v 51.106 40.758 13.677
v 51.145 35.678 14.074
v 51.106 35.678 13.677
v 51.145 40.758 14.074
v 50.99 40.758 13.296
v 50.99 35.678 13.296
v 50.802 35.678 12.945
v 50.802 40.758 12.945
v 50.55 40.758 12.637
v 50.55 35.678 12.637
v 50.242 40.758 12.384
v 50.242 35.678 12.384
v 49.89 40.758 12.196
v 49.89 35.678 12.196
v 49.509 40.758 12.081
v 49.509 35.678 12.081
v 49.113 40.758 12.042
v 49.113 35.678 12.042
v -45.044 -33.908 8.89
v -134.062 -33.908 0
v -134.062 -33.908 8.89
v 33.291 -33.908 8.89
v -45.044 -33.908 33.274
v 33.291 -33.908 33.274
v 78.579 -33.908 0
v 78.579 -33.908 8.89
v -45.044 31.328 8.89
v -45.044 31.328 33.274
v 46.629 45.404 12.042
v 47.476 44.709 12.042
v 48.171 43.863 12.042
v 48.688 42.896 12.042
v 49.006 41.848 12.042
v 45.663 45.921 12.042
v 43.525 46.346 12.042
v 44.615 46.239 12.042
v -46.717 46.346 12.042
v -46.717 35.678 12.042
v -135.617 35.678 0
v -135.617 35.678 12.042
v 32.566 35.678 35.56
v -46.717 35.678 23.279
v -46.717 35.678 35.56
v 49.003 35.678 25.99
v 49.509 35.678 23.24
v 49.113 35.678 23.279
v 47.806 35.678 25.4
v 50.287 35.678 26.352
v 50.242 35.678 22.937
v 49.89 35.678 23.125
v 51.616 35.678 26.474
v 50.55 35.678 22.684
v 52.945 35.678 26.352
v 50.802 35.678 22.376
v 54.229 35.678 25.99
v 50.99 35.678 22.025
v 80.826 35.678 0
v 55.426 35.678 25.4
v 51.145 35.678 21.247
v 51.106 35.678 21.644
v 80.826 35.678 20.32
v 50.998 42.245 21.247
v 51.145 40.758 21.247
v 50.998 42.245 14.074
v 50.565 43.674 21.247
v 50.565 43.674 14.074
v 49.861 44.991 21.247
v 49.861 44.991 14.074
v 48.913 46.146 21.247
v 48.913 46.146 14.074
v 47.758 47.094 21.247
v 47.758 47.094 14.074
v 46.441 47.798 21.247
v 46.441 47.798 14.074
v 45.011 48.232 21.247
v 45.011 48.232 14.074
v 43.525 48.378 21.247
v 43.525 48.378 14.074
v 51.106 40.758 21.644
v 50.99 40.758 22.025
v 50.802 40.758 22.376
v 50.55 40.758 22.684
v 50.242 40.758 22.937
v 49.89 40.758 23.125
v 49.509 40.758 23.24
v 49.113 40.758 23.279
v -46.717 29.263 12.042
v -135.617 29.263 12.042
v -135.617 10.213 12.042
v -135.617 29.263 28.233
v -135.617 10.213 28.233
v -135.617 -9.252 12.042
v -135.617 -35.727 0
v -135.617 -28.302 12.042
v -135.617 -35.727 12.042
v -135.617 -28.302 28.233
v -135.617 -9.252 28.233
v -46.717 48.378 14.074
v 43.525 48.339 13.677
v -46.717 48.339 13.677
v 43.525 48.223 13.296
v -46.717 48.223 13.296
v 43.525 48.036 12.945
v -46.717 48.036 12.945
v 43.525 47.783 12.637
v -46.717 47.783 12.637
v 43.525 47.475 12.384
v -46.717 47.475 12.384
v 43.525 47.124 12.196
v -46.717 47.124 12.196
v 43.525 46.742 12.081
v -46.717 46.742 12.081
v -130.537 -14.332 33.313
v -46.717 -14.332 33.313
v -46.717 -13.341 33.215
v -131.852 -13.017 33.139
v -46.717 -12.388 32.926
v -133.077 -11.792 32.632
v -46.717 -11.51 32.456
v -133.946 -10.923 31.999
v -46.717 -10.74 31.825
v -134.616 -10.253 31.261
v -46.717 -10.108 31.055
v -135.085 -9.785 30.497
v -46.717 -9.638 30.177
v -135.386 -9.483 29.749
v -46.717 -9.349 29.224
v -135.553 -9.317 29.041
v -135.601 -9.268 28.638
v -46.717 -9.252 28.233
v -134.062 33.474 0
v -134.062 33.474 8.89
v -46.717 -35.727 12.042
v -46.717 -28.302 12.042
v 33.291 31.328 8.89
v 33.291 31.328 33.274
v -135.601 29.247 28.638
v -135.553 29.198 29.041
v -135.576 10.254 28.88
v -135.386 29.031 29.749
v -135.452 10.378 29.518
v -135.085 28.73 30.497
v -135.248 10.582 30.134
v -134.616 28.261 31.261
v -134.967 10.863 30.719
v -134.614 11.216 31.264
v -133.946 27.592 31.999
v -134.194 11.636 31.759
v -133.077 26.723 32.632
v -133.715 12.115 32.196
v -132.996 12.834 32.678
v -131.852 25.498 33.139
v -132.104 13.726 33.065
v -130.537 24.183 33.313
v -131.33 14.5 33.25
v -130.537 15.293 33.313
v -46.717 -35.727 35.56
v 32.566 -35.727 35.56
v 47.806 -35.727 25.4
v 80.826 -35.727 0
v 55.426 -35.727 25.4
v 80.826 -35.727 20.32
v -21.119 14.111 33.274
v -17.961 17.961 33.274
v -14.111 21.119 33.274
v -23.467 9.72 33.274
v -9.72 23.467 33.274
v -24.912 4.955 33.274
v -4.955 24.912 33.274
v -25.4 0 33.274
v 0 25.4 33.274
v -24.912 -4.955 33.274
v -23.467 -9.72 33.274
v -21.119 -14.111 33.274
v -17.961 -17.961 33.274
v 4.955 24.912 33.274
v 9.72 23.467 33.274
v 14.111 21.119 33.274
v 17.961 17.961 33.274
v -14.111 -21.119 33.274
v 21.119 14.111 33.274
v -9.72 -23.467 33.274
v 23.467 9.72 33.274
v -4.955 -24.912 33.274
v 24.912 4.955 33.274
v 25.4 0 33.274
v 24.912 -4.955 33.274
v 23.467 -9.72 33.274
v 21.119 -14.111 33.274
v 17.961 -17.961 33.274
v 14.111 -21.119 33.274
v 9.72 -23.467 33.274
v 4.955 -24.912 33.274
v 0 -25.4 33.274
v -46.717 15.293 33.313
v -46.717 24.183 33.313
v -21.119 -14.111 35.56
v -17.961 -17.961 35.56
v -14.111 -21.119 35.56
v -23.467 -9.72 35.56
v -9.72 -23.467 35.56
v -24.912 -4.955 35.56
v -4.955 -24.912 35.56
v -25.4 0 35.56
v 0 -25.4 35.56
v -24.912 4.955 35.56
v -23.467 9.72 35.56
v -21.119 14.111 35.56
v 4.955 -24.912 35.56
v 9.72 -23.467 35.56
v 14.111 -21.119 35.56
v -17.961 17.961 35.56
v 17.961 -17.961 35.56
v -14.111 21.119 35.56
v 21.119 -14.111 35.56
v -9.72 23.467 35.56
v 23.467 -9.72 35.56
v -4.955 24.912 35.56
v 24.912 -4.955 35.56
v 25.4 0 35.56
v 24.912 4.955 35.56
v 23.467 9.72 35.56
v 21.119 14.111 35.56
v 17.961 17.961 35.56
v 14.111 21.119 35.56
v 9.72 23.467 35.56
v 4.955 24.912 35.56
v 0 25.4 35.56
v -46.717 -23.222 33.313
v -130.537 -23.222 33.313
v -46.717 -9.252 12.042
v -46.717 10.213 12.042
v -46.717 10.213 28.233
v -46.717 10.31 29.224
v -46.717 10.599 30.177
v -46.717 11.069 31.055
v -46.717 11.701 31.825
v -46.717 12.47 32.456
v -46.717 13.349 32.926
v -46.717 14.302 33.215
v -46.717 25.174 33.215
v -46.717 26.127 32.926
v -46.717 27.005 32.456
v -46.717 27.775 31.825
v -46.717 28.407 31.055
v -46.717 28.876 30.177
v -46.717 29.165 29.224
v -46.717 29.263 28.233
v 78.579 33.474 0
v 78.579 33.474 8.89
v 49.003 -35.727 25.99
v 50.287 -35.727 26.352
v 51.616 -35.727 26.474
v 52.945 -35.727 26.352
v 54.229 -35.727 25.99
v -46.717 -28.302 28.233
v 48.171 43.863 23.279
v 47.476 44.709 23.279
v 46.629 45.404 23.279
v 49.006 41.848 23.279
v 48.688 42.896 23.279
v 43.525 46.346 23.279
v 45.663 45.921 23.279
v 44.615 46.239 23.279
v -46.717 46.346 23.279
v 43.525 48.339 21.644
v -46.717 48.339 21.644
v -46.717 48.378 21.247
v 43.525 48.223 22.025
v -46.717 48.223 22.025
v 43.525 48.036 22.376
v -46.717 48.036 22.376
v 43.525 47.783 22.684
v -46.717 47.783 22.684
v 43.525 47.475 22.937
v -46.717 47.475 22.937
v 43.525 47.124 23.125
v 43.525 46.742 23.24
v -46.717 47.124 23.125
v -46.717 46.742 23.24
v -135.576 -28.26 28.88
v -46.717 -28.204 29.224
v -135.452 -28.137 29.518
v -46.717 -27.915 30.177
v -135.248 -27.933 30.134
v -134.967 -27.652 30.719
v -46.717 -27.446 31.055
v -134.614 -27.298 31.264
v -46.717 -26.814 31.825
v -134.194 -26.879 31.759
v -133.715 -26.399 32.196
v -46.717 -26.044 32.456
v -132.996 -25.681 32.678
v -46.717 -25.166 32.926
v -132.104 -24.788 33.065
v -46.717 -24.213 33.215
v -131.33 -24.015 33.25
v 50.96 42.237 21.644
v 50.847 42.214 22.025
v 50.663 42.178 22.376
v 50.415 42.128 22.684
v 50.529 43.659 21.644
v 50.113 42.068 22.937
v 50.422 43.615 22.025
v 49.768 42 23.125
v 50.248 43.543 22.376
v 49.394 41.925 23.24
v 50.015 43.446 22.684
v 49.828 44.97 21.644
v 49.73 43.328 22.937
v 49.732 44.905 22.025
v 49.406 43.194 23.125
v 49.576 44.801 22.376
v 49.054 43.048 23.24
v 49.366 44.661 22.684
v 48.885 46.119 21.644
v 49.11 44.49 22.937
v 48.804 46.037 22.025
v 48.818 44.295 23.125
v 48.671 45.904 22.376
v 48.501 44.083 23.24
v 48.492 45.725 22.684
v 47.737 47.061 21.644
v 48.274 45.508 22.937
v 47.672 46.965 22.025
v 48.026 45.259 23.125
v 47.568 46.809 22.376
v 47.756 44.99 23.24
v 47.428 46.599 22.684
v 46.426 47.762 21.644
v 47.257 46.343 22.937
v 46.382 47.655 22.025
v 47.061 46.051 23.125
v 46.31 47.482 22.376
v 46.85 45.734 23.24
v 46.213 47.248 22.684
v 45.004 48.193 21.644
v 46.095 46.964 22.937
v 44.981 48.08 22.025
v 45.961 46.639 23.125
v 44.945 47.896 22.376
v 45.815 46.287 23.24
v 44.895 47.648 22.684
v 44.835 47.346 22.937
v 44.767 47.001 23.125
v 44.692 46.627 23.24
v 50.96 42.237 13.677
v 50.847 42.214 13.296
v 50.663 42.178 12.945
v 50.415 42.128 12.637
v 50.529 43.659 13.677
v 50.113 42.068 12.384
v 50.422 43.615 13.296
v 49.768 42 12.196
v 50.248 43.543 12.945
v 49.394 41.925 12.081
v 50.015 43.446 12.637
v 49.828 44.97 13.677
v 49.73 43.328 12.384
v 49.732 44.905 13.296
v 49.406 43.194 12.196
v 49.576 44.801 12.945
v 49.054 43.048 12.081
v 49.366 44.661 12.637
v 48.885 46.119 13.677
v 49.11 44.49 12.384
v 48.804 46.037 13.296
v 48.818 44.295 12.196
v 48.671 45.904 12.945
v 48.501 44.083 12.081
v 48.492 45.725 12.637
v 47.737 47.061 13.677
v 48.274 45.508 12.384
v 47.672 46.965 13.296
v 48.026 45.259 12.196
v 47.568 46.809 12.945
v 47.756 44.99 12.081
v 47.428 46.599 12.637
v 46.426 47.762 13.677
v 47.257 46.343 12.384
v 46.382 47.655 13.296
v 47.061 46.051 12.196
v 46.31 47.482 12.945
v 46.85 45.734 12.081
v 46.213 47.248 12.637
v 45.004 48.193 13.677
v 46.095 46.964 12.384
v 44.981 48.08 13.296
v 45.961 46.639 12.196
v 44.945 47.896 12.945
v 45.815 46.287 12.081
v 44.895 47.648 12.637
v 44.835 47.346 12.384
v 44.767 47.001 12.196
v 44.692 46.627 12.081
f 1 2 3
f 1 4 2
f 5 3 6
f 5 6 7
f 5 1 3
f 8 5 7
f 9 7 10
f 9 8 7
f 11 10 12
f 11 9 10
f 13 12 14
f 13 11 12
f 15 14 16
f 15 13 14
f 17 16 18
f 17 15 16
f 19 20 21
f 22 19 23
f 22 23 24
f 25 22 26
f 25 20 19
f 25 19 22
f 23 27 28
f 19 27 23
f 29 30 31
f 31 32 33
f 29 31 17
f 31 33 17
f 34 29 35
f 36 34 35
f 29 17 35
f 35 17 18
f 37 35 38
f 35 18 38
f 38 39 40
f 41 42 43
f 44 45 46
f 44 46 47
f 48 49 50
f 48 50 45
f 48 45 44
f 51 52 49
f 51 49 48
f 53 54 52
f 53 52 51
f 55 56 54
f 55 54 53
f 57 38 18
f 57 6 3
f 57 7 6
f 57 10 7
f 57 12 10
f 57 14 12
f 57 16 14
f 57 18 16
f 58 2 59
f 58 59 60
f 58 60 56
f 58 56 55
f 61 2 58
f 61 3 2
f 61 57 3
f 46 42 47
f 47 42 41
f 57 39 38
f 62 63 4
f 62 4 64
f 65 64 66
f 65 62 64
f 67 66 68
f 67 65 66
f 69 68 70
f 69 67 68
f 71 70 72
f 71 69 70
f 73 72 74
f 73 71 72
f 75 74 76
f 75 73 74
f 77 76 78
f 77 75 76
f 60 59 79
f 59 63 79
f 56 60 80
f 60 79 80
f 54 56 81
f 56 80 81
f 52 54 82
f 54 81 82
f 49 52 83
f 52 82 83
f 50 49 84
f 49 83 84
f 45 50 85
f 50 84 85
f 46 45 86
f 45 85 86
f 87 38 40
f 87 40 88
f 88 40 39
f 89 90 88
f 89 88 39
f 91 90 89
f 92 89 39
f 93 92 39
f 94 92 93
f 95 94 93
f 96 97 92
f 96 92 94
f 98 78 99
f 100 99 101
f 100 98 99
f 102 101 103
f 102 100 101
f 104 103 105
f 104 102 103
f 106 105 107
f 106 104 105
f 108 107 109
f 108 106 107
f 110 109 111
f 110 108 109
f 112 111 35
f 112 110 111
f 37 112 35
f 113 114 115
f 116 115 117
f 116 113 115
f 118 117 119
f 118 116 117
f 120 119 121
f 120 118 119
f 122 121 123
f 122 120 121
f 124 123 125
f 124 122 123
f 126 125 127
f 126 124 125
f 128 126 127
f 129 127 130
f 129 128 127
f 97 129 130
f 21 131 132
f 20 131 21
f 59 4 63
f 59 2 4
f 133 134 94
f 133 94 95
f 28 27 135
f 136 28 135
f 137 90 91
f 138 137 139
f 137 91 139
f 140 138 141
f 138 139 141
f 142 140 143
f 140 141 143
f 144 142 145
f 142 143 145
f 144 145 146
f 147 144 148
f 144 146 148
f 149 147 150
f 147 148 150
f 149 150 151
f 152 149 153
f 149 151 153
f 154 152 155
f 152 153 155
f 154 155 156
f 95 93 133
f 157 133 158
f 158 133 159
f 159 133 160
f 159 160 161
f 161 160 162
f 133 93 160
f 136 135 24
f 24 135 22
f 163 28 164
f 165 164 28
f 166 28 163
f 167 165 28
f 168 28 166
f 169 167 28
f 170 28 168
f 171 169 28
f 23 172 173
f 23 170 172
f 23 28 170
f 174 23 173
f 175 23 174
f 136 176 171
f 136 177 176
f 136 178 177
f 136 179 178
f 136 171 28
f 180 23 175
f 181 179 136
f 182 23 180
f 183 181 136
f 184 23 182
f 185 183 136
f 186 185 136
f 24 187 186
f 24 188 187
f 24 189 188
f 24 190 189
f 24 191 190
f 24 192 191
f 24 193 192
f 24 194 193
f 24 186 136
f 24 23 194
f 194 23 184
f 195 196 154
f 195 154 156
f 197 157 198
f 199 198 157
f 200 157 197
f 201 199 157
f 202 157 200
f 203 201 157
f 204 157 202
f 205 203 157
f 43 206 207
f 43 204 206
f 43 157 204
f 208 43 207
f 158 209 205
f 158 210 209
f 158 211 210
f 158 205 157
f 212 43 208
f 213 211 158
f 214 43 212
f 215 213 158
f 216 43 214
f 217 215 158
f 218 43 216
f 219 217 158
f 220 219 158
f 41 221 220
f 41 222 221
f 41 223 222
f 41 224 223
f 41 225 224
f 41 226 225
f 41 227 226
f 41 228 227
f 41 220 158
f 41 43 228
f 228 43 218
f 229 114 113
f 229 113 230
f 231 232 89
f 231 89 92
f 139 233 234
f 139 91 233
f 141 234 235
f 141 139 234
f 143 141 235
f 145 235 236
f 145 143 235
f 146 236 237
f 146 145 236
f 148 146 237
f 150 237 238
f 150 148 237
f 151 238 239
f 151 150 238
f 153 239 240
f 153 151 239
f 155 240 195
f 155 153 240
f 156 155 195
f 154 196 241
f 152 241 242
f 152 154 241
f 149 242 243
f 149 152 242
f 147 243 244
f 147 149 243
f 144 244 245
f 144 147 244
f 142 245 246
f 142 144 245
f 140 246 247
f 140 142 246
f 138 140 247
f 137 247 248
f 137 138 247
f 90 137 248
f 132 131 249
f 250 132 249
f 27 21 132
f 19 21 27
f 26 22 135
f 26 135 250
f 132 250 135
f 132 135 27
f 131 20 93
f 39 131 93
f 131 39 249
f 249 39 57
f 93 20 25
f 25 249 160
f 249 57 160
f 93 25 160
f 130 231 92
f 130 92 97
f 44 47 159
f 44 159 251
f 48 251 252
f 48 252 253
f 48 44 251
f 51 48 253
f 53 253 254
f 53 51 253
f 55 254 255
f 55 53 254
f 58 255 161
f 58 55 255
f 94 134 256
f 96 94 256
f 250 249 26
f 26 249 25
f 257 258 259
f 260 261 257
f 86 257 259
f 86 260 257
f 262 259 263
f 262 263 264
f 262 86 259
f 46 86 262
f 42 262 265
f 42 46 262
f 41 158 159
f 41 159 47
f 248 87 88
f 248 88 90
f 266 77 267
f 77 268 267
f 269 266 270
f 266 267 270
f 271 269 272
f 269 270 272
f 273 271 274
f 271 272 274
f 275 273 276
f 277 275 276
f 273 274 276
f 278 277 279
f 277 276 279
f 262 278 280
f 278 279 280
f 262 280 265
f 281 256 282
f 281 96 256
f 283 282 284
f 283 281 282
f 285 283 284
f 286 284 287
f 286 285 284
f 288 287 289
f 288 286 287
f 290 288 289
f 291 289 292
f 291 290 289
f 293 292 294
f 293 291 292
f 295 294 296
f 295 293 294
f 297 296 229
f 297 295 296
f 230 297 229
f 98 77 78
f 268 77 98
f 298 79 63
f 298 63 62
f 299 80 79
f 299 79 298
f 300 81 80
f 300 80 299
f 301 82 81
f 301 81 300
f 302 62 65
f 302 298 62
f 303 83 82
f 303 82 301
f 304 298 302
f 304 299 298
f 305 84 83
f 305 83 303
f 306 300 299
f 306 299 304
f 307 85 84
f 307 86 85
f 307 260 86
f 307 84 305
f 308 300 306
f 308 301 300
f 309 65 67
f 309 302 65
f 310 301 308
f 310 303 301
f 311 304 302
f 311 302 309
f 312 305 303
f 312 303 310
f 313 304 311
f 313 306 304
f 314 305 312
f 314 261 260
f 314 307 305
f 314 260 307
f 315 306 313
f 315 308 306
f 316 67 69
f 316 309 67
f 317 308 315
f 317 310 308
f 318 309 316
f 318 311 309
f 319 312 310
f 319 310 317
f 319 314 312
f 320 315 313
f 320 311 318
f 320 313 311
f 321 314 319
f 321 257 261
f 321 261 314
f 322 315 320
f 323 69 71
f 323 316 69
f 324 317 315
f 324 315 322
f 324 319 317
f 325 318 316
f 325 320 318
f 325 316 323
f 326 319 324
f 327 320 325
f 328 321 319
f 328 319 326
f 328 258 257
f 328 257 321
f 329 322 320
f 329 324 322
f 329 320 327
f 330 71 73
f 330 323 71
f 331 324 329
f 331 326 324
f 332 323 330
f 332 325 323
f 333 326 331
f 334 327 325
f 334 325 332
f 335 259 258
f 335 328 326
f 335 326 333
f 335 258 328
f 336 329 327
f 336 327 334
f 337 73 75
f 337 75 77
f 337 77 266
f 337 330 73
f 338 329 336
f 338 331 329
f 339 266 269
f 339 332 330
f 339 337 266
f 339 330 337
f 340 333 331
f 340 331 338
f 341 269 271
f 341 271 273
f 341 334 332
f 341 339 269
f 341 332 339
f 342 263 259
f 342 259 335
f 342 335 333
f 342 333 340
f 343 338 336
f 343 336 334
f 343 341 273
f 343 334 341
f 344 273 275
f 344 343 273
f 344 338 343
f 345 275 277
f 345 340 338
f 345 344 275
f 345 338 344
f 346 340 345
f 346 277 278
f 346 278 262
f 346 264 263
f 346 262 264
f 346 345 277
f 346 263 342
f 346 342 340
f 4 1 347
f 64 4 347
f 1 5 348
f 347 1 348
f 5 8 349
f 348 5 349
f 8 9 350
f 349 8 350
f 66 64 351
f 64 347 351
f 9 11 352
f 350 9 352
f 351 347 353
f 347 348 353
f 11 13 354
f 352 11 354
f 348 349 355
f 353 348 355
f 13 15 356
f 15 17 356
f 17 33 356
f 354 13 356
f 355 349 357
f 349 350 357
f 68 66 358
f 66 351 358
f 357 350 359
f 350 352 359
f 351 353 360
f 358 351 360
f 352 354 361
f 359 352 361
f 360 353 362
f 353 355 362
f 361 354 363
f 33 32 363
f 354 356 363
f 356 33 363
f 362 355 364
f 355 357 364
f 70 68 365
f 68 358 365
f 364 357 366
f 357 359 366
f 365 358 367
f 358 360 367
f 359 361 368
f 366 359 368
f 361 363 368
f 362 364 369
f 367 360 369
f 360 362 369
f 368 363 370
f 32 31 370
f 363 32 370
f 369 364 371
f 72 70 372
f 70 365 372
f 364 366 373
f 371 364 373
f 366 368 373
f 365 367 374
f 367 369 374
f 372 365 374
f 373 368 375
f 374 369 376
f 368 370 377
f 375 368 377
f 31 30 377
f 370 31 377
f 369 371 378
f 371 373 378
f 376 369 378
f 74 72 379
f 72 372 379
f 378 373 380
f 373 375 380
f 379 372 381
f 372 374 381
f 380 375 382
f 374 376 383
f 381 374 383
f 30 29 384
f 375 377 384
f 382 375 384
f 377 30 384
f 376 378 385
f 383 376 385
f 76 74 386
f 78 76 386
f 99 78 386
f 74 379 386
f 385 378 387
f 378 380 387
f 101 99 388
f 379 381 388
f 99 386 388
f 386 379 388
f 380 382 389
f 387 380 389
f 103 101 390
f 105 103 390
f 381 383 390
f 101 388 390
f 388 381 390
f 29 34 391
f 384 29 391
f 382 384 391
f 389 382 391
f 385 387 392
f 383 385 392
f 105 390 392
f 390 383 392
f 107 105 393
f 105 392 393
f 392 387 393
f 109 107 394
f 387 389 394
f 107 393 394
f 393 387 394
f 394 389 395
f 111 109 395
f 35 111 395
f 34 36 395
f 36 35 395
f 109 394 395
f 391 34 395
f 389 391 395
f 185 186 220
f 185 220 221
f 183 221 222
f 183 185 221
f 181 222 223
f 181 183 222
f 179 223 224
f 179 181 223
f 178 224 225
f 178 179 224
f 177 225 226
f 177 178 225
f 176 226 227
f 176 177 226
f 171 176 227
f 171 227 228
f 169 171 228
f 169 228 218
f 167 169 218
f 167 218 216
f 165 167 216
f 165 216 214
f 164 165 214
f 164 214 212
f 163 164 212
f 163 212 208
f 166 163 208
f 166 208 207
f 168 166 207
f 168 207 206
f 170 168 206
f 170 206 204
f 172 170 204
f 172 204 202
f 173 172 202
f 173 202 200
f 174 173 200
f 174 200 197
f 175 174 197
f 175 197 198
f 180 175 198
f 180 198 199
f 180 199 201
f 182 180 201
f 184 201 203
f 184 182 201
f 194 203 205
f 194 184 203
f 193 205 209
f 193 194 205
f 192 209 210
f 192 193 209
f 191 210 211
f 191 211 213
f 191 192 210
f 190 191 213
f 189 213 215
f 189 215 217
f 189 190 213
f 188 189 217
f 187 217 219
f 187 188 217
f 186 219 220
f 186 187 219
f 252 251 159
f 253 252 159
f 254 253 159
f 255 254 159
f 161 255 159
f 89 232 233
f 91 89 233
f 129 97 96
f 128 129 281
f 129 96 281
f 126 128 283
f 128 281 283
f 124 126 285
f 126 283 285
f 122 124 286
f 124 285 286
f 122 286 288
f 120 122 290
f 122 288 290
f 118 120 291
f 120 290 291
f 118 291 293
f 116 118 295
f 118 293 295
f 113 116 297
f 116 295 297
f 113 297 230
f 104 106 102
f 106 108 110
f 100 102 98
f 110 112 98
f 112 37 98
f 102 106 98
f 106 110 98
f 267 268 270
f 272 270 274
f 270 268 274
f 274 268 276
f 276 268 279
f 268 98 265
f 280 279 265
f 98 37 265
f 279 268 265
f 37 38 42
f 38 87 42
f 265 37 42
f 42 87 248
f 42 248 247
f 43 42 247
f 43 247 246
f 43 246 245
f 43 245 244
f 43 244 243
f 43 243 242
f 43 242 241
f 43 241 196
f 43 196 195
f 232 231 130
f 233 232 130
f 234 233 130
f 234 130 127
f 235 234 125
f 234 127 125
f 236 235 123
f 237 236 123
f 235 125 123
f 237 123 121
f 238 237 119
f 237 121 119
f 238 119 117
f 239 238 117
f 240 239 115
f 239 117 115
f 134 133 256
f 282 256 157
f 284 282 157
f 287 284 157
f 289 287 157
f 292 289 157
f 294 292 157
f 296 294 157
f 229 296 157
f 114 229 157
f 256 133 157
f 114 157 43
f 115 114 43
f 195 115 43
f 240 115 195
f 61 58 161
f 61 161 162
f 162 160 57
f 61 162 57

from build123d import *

# Parameters (mm, degrees)
F0_W        = 94.5233479142
F0_H        = 71.4051574469
F1_DEPTH    = 35.56
F2_R        = 25.4
F3_DEPTH    = 35.56
F4_SIZE2    = 15.24
F4_SIZE     = 10.16
F5_DEPTH    = 7.62
F7_DEPTH    = 71.4051658
F8_DEPTH    = 25.4
F9_T4_DEPTH = 203.3902674307
F9_S5_R     = 7.295449901
F9_T6_DEPTH = 104
F10_W       = 71.4051574469
F10_H       = 12.0417065918
F11_DEPTH   = 88.9
F12_W       = 19.05
F12_H       = 21.2708730352
F13_DEPTH   = 88.9
F14_W       = 19.05
F14_H       = 21.2708730352
F15_DEPTH   = 88.9
F16_R       = 5.08
F17_W       = 97.8622660041
F17_H       = 11.2377274781
F18_DEPTH   = 12.7
F19_R       = 7.62
F20_R       = 2.032
F21_W       = 212.6409783959
F21_H       = 67.3823393881
F22_DEPTH   = 8.89
F23_W       = 78.3353857696
F23_H       = 65.2360282838
F24_DEPTH   = 24.384


# Not quite as in the source:
# - a fillet or chamfer that OpenCascade refuses, or shapes differently, is made with other operations: its cross-section is extruded or revolved along the edge and cut away or added


with BuildPart() as f1:
    # F0 (on Top) → F1 (new body)
    with BuildSketch(Plane.XY):
        with Locations((0.5442798138, -0.0245943666)):
            Rectangle(F0_W, F0_H)
    extrude(amount=F1_DEPTH)

    # F2 (on Top) → F3 (cut)
    with BuildSketch(Plane.XY):
        Circle(F2_R)
    extrude(amount=F3_DEPTH, mode=Mode.SUBTRACT)

    # F4
    f4_edges = [f1.edges().sort_by_distance(p)[0] for p in [
        (47.805954, -0.024594, 35.56),
    ]]
    f4_side = f1.faces().sort_by_distance((47.805954, -0.024594, 17.78))[0]
    chamfer(f4_edges, length=F4_SIZE, length2=F4_SIZE2, reference=f4_side)

    # F5 (add): a face of the model
    f5_faces = [f1.faces().sort_by_distance(p)[0] for p in [
        (47.8059537709, -0.0245943666, 12.7),
    ]]
    extrude(f5_faces, amount=F5_DEPTH)

    # F6 (on face) → F7 (join)
    with BuildSketch(Plane(origin=(0, 35.6779843569, 0), x_dir=(-1, 0, 0), z_dir=(0, 1, 0))):
        with BuildLine():
            Line((-55.4259537709, 25.4), (-47.8059537709, 25.4))
            ThreePointArc((-47.8059537709, 25.4), (-51.6159537709, 26.473915584), (-55.4259537709, 25.4))
        make_face()
    extrude(amount=-F7_DEPTH)

    # F8 (add): a face of the model
    f8_faces = [f1.faces().sort_by_distance(p)[0] for p in [
        (55.4259537709, -0.0245943666, 12.7),
    ]]
    extrude(f8_faces, amount=F8_DEPTH)

    # F9: chamfer of 5.08 x 25.4 on 1 edges, made by hand


with BuildPart() as f9_tool2:
    # F9_s3 → F9_t4 (new body)
    with BuildSketch(Plane.XZ.offset(101.7197280819)):
        Polygon((55.4259537709, 25.4), (80.8259537709, 20.32), (80.8259537709, 25.4), align=None)
    extrude(amount=-F9_T4_DEPTH)

    # F9_s5 → F9_t6 (cut, symmetric)
    with BuildSketch(Plane.XZ):
        with Locations((51.6159537709, 19.178465683)):
            Circle(F9_S5_R)
    extrude(amount=F9_T6_DEPTH, both=True, mode=Mode.SUBTRACT)


with BuildPart() as f1_1:
    add(f1.part)

    # F9_t1: cut F9_tool2
    add(f9_tool2.part, mode=Mode.SUBTRACT)

    # F10 (on face) → F11 (join)
    with BuildSketch(Plane(origin=(-46.7173941433, 0, 0), x_dir=(0, -1, 0), z_dir=(-1, 0, 0))):
        with Locations((0.0245943666, 6.0208532959)):
            Rectangle(F10_W, F10_H)
    extrude(amount=F11_DEPTH)

    # F12 (on face) → F13 (join)
    with BuildSketch(Plane(origin=(-46.7173941433, 0, 0), x_dir=(0, -1, 0), z_dir=(-1, 0, 0))):
        with Locations((-19.7377734572, 22.6771431095)):
            Rectangle(F12_W, F12_H)
    extrude(amount=F13_DEPTH)

    # F14 (on face) → F15 (join)
    with BuildSketch(Plane(origin=(-46.7173941433, 0, 0), x_dir=(0, -1, 0), z_dir=(-1, 0, 0))):
        with Locations((18.7768059537, 22.6771431095)):
            Rectangle(F14_W, F14_H)
    extrude(amount=F15_DEPTH)

    # F16
    f16_edges = [f1_1.edges().sort_by_distance(p)[0] for p in [
        (-91.167394, 29.262773, 33.31258),
        (-91.167394, 10.212773, 33.31258),
        (-91.167394, -9.251806, 33.31258),
        (-91.167394, -28.301806, 33.31258),
        (-135.617394, 19.737773, 33.31258),
        (-135.617394, -18.776806, 33.31258),
    ]]
    fillet(f16_edges, radius=F16_R)

    # F17 (on face) → F18 (join)
    with BuildSketch(Plane(origin=(0, 35.6779843569, 0), x_dir=(-1, 0, 0), z_dir=(0, 1, 0))):
        with Locations((-2.2137388587, 17.6605703309)):
            Rectangle(F17_W, F17_H)
    extrude(amount=F18_DEPTH)

    # F19
    f19_edges = [f1_1.edges().sort_by_distance(p)[0] for p in [
        (51.144872, 48.377984, 17.66057),
    ]]
    fillet(f19_edges, radius=F19_R)

    # F20
    f20_edges = [f1_1.edges().sort_by_distance(p)[0] for p in [
        (48.913026, 46.146138, 23.279434),
        (51.144872, 38.217984, 23.279434),
        (-1.596261, 48.377984, 23.279434),
        (51.144872, 38.217984, 12.041707),
        (48.913026, 46.146138, 12.041707),
        (-1.596261, 48.377984, 12.041707),
    ]]
    fillet(f20_edges, radius=F20_R)

    # F21 (on face) → F22 (cut, symmetric)
    with BuildSketch(Plane(origin=(0, 0, 0), x_dir=(1, 0, 0), z_dir=(0, 0, -1))):
        with Locations((-27.7419649065, 0.2171527594)):
            Rectangle(F21_W, F21_H)
    extrude(amount=F22_DEPTH, both=True, mode=Mode.SUBTRACT)

    # F23 (on face) → F24 (cut)
    with BuildSketch(Plane(origin=(0, 0, 8.89), x_dir=(1, 0, 0), z_dir=(0, 0, -1))):
        with Locations((-5.8767069131, 1.2903083116)):
            Rectangle(F23_W, F23_H)
    extrude(amount=-F24_DEPTH, mode=Mode.SUBTRACT)


solid = f1_1.part
